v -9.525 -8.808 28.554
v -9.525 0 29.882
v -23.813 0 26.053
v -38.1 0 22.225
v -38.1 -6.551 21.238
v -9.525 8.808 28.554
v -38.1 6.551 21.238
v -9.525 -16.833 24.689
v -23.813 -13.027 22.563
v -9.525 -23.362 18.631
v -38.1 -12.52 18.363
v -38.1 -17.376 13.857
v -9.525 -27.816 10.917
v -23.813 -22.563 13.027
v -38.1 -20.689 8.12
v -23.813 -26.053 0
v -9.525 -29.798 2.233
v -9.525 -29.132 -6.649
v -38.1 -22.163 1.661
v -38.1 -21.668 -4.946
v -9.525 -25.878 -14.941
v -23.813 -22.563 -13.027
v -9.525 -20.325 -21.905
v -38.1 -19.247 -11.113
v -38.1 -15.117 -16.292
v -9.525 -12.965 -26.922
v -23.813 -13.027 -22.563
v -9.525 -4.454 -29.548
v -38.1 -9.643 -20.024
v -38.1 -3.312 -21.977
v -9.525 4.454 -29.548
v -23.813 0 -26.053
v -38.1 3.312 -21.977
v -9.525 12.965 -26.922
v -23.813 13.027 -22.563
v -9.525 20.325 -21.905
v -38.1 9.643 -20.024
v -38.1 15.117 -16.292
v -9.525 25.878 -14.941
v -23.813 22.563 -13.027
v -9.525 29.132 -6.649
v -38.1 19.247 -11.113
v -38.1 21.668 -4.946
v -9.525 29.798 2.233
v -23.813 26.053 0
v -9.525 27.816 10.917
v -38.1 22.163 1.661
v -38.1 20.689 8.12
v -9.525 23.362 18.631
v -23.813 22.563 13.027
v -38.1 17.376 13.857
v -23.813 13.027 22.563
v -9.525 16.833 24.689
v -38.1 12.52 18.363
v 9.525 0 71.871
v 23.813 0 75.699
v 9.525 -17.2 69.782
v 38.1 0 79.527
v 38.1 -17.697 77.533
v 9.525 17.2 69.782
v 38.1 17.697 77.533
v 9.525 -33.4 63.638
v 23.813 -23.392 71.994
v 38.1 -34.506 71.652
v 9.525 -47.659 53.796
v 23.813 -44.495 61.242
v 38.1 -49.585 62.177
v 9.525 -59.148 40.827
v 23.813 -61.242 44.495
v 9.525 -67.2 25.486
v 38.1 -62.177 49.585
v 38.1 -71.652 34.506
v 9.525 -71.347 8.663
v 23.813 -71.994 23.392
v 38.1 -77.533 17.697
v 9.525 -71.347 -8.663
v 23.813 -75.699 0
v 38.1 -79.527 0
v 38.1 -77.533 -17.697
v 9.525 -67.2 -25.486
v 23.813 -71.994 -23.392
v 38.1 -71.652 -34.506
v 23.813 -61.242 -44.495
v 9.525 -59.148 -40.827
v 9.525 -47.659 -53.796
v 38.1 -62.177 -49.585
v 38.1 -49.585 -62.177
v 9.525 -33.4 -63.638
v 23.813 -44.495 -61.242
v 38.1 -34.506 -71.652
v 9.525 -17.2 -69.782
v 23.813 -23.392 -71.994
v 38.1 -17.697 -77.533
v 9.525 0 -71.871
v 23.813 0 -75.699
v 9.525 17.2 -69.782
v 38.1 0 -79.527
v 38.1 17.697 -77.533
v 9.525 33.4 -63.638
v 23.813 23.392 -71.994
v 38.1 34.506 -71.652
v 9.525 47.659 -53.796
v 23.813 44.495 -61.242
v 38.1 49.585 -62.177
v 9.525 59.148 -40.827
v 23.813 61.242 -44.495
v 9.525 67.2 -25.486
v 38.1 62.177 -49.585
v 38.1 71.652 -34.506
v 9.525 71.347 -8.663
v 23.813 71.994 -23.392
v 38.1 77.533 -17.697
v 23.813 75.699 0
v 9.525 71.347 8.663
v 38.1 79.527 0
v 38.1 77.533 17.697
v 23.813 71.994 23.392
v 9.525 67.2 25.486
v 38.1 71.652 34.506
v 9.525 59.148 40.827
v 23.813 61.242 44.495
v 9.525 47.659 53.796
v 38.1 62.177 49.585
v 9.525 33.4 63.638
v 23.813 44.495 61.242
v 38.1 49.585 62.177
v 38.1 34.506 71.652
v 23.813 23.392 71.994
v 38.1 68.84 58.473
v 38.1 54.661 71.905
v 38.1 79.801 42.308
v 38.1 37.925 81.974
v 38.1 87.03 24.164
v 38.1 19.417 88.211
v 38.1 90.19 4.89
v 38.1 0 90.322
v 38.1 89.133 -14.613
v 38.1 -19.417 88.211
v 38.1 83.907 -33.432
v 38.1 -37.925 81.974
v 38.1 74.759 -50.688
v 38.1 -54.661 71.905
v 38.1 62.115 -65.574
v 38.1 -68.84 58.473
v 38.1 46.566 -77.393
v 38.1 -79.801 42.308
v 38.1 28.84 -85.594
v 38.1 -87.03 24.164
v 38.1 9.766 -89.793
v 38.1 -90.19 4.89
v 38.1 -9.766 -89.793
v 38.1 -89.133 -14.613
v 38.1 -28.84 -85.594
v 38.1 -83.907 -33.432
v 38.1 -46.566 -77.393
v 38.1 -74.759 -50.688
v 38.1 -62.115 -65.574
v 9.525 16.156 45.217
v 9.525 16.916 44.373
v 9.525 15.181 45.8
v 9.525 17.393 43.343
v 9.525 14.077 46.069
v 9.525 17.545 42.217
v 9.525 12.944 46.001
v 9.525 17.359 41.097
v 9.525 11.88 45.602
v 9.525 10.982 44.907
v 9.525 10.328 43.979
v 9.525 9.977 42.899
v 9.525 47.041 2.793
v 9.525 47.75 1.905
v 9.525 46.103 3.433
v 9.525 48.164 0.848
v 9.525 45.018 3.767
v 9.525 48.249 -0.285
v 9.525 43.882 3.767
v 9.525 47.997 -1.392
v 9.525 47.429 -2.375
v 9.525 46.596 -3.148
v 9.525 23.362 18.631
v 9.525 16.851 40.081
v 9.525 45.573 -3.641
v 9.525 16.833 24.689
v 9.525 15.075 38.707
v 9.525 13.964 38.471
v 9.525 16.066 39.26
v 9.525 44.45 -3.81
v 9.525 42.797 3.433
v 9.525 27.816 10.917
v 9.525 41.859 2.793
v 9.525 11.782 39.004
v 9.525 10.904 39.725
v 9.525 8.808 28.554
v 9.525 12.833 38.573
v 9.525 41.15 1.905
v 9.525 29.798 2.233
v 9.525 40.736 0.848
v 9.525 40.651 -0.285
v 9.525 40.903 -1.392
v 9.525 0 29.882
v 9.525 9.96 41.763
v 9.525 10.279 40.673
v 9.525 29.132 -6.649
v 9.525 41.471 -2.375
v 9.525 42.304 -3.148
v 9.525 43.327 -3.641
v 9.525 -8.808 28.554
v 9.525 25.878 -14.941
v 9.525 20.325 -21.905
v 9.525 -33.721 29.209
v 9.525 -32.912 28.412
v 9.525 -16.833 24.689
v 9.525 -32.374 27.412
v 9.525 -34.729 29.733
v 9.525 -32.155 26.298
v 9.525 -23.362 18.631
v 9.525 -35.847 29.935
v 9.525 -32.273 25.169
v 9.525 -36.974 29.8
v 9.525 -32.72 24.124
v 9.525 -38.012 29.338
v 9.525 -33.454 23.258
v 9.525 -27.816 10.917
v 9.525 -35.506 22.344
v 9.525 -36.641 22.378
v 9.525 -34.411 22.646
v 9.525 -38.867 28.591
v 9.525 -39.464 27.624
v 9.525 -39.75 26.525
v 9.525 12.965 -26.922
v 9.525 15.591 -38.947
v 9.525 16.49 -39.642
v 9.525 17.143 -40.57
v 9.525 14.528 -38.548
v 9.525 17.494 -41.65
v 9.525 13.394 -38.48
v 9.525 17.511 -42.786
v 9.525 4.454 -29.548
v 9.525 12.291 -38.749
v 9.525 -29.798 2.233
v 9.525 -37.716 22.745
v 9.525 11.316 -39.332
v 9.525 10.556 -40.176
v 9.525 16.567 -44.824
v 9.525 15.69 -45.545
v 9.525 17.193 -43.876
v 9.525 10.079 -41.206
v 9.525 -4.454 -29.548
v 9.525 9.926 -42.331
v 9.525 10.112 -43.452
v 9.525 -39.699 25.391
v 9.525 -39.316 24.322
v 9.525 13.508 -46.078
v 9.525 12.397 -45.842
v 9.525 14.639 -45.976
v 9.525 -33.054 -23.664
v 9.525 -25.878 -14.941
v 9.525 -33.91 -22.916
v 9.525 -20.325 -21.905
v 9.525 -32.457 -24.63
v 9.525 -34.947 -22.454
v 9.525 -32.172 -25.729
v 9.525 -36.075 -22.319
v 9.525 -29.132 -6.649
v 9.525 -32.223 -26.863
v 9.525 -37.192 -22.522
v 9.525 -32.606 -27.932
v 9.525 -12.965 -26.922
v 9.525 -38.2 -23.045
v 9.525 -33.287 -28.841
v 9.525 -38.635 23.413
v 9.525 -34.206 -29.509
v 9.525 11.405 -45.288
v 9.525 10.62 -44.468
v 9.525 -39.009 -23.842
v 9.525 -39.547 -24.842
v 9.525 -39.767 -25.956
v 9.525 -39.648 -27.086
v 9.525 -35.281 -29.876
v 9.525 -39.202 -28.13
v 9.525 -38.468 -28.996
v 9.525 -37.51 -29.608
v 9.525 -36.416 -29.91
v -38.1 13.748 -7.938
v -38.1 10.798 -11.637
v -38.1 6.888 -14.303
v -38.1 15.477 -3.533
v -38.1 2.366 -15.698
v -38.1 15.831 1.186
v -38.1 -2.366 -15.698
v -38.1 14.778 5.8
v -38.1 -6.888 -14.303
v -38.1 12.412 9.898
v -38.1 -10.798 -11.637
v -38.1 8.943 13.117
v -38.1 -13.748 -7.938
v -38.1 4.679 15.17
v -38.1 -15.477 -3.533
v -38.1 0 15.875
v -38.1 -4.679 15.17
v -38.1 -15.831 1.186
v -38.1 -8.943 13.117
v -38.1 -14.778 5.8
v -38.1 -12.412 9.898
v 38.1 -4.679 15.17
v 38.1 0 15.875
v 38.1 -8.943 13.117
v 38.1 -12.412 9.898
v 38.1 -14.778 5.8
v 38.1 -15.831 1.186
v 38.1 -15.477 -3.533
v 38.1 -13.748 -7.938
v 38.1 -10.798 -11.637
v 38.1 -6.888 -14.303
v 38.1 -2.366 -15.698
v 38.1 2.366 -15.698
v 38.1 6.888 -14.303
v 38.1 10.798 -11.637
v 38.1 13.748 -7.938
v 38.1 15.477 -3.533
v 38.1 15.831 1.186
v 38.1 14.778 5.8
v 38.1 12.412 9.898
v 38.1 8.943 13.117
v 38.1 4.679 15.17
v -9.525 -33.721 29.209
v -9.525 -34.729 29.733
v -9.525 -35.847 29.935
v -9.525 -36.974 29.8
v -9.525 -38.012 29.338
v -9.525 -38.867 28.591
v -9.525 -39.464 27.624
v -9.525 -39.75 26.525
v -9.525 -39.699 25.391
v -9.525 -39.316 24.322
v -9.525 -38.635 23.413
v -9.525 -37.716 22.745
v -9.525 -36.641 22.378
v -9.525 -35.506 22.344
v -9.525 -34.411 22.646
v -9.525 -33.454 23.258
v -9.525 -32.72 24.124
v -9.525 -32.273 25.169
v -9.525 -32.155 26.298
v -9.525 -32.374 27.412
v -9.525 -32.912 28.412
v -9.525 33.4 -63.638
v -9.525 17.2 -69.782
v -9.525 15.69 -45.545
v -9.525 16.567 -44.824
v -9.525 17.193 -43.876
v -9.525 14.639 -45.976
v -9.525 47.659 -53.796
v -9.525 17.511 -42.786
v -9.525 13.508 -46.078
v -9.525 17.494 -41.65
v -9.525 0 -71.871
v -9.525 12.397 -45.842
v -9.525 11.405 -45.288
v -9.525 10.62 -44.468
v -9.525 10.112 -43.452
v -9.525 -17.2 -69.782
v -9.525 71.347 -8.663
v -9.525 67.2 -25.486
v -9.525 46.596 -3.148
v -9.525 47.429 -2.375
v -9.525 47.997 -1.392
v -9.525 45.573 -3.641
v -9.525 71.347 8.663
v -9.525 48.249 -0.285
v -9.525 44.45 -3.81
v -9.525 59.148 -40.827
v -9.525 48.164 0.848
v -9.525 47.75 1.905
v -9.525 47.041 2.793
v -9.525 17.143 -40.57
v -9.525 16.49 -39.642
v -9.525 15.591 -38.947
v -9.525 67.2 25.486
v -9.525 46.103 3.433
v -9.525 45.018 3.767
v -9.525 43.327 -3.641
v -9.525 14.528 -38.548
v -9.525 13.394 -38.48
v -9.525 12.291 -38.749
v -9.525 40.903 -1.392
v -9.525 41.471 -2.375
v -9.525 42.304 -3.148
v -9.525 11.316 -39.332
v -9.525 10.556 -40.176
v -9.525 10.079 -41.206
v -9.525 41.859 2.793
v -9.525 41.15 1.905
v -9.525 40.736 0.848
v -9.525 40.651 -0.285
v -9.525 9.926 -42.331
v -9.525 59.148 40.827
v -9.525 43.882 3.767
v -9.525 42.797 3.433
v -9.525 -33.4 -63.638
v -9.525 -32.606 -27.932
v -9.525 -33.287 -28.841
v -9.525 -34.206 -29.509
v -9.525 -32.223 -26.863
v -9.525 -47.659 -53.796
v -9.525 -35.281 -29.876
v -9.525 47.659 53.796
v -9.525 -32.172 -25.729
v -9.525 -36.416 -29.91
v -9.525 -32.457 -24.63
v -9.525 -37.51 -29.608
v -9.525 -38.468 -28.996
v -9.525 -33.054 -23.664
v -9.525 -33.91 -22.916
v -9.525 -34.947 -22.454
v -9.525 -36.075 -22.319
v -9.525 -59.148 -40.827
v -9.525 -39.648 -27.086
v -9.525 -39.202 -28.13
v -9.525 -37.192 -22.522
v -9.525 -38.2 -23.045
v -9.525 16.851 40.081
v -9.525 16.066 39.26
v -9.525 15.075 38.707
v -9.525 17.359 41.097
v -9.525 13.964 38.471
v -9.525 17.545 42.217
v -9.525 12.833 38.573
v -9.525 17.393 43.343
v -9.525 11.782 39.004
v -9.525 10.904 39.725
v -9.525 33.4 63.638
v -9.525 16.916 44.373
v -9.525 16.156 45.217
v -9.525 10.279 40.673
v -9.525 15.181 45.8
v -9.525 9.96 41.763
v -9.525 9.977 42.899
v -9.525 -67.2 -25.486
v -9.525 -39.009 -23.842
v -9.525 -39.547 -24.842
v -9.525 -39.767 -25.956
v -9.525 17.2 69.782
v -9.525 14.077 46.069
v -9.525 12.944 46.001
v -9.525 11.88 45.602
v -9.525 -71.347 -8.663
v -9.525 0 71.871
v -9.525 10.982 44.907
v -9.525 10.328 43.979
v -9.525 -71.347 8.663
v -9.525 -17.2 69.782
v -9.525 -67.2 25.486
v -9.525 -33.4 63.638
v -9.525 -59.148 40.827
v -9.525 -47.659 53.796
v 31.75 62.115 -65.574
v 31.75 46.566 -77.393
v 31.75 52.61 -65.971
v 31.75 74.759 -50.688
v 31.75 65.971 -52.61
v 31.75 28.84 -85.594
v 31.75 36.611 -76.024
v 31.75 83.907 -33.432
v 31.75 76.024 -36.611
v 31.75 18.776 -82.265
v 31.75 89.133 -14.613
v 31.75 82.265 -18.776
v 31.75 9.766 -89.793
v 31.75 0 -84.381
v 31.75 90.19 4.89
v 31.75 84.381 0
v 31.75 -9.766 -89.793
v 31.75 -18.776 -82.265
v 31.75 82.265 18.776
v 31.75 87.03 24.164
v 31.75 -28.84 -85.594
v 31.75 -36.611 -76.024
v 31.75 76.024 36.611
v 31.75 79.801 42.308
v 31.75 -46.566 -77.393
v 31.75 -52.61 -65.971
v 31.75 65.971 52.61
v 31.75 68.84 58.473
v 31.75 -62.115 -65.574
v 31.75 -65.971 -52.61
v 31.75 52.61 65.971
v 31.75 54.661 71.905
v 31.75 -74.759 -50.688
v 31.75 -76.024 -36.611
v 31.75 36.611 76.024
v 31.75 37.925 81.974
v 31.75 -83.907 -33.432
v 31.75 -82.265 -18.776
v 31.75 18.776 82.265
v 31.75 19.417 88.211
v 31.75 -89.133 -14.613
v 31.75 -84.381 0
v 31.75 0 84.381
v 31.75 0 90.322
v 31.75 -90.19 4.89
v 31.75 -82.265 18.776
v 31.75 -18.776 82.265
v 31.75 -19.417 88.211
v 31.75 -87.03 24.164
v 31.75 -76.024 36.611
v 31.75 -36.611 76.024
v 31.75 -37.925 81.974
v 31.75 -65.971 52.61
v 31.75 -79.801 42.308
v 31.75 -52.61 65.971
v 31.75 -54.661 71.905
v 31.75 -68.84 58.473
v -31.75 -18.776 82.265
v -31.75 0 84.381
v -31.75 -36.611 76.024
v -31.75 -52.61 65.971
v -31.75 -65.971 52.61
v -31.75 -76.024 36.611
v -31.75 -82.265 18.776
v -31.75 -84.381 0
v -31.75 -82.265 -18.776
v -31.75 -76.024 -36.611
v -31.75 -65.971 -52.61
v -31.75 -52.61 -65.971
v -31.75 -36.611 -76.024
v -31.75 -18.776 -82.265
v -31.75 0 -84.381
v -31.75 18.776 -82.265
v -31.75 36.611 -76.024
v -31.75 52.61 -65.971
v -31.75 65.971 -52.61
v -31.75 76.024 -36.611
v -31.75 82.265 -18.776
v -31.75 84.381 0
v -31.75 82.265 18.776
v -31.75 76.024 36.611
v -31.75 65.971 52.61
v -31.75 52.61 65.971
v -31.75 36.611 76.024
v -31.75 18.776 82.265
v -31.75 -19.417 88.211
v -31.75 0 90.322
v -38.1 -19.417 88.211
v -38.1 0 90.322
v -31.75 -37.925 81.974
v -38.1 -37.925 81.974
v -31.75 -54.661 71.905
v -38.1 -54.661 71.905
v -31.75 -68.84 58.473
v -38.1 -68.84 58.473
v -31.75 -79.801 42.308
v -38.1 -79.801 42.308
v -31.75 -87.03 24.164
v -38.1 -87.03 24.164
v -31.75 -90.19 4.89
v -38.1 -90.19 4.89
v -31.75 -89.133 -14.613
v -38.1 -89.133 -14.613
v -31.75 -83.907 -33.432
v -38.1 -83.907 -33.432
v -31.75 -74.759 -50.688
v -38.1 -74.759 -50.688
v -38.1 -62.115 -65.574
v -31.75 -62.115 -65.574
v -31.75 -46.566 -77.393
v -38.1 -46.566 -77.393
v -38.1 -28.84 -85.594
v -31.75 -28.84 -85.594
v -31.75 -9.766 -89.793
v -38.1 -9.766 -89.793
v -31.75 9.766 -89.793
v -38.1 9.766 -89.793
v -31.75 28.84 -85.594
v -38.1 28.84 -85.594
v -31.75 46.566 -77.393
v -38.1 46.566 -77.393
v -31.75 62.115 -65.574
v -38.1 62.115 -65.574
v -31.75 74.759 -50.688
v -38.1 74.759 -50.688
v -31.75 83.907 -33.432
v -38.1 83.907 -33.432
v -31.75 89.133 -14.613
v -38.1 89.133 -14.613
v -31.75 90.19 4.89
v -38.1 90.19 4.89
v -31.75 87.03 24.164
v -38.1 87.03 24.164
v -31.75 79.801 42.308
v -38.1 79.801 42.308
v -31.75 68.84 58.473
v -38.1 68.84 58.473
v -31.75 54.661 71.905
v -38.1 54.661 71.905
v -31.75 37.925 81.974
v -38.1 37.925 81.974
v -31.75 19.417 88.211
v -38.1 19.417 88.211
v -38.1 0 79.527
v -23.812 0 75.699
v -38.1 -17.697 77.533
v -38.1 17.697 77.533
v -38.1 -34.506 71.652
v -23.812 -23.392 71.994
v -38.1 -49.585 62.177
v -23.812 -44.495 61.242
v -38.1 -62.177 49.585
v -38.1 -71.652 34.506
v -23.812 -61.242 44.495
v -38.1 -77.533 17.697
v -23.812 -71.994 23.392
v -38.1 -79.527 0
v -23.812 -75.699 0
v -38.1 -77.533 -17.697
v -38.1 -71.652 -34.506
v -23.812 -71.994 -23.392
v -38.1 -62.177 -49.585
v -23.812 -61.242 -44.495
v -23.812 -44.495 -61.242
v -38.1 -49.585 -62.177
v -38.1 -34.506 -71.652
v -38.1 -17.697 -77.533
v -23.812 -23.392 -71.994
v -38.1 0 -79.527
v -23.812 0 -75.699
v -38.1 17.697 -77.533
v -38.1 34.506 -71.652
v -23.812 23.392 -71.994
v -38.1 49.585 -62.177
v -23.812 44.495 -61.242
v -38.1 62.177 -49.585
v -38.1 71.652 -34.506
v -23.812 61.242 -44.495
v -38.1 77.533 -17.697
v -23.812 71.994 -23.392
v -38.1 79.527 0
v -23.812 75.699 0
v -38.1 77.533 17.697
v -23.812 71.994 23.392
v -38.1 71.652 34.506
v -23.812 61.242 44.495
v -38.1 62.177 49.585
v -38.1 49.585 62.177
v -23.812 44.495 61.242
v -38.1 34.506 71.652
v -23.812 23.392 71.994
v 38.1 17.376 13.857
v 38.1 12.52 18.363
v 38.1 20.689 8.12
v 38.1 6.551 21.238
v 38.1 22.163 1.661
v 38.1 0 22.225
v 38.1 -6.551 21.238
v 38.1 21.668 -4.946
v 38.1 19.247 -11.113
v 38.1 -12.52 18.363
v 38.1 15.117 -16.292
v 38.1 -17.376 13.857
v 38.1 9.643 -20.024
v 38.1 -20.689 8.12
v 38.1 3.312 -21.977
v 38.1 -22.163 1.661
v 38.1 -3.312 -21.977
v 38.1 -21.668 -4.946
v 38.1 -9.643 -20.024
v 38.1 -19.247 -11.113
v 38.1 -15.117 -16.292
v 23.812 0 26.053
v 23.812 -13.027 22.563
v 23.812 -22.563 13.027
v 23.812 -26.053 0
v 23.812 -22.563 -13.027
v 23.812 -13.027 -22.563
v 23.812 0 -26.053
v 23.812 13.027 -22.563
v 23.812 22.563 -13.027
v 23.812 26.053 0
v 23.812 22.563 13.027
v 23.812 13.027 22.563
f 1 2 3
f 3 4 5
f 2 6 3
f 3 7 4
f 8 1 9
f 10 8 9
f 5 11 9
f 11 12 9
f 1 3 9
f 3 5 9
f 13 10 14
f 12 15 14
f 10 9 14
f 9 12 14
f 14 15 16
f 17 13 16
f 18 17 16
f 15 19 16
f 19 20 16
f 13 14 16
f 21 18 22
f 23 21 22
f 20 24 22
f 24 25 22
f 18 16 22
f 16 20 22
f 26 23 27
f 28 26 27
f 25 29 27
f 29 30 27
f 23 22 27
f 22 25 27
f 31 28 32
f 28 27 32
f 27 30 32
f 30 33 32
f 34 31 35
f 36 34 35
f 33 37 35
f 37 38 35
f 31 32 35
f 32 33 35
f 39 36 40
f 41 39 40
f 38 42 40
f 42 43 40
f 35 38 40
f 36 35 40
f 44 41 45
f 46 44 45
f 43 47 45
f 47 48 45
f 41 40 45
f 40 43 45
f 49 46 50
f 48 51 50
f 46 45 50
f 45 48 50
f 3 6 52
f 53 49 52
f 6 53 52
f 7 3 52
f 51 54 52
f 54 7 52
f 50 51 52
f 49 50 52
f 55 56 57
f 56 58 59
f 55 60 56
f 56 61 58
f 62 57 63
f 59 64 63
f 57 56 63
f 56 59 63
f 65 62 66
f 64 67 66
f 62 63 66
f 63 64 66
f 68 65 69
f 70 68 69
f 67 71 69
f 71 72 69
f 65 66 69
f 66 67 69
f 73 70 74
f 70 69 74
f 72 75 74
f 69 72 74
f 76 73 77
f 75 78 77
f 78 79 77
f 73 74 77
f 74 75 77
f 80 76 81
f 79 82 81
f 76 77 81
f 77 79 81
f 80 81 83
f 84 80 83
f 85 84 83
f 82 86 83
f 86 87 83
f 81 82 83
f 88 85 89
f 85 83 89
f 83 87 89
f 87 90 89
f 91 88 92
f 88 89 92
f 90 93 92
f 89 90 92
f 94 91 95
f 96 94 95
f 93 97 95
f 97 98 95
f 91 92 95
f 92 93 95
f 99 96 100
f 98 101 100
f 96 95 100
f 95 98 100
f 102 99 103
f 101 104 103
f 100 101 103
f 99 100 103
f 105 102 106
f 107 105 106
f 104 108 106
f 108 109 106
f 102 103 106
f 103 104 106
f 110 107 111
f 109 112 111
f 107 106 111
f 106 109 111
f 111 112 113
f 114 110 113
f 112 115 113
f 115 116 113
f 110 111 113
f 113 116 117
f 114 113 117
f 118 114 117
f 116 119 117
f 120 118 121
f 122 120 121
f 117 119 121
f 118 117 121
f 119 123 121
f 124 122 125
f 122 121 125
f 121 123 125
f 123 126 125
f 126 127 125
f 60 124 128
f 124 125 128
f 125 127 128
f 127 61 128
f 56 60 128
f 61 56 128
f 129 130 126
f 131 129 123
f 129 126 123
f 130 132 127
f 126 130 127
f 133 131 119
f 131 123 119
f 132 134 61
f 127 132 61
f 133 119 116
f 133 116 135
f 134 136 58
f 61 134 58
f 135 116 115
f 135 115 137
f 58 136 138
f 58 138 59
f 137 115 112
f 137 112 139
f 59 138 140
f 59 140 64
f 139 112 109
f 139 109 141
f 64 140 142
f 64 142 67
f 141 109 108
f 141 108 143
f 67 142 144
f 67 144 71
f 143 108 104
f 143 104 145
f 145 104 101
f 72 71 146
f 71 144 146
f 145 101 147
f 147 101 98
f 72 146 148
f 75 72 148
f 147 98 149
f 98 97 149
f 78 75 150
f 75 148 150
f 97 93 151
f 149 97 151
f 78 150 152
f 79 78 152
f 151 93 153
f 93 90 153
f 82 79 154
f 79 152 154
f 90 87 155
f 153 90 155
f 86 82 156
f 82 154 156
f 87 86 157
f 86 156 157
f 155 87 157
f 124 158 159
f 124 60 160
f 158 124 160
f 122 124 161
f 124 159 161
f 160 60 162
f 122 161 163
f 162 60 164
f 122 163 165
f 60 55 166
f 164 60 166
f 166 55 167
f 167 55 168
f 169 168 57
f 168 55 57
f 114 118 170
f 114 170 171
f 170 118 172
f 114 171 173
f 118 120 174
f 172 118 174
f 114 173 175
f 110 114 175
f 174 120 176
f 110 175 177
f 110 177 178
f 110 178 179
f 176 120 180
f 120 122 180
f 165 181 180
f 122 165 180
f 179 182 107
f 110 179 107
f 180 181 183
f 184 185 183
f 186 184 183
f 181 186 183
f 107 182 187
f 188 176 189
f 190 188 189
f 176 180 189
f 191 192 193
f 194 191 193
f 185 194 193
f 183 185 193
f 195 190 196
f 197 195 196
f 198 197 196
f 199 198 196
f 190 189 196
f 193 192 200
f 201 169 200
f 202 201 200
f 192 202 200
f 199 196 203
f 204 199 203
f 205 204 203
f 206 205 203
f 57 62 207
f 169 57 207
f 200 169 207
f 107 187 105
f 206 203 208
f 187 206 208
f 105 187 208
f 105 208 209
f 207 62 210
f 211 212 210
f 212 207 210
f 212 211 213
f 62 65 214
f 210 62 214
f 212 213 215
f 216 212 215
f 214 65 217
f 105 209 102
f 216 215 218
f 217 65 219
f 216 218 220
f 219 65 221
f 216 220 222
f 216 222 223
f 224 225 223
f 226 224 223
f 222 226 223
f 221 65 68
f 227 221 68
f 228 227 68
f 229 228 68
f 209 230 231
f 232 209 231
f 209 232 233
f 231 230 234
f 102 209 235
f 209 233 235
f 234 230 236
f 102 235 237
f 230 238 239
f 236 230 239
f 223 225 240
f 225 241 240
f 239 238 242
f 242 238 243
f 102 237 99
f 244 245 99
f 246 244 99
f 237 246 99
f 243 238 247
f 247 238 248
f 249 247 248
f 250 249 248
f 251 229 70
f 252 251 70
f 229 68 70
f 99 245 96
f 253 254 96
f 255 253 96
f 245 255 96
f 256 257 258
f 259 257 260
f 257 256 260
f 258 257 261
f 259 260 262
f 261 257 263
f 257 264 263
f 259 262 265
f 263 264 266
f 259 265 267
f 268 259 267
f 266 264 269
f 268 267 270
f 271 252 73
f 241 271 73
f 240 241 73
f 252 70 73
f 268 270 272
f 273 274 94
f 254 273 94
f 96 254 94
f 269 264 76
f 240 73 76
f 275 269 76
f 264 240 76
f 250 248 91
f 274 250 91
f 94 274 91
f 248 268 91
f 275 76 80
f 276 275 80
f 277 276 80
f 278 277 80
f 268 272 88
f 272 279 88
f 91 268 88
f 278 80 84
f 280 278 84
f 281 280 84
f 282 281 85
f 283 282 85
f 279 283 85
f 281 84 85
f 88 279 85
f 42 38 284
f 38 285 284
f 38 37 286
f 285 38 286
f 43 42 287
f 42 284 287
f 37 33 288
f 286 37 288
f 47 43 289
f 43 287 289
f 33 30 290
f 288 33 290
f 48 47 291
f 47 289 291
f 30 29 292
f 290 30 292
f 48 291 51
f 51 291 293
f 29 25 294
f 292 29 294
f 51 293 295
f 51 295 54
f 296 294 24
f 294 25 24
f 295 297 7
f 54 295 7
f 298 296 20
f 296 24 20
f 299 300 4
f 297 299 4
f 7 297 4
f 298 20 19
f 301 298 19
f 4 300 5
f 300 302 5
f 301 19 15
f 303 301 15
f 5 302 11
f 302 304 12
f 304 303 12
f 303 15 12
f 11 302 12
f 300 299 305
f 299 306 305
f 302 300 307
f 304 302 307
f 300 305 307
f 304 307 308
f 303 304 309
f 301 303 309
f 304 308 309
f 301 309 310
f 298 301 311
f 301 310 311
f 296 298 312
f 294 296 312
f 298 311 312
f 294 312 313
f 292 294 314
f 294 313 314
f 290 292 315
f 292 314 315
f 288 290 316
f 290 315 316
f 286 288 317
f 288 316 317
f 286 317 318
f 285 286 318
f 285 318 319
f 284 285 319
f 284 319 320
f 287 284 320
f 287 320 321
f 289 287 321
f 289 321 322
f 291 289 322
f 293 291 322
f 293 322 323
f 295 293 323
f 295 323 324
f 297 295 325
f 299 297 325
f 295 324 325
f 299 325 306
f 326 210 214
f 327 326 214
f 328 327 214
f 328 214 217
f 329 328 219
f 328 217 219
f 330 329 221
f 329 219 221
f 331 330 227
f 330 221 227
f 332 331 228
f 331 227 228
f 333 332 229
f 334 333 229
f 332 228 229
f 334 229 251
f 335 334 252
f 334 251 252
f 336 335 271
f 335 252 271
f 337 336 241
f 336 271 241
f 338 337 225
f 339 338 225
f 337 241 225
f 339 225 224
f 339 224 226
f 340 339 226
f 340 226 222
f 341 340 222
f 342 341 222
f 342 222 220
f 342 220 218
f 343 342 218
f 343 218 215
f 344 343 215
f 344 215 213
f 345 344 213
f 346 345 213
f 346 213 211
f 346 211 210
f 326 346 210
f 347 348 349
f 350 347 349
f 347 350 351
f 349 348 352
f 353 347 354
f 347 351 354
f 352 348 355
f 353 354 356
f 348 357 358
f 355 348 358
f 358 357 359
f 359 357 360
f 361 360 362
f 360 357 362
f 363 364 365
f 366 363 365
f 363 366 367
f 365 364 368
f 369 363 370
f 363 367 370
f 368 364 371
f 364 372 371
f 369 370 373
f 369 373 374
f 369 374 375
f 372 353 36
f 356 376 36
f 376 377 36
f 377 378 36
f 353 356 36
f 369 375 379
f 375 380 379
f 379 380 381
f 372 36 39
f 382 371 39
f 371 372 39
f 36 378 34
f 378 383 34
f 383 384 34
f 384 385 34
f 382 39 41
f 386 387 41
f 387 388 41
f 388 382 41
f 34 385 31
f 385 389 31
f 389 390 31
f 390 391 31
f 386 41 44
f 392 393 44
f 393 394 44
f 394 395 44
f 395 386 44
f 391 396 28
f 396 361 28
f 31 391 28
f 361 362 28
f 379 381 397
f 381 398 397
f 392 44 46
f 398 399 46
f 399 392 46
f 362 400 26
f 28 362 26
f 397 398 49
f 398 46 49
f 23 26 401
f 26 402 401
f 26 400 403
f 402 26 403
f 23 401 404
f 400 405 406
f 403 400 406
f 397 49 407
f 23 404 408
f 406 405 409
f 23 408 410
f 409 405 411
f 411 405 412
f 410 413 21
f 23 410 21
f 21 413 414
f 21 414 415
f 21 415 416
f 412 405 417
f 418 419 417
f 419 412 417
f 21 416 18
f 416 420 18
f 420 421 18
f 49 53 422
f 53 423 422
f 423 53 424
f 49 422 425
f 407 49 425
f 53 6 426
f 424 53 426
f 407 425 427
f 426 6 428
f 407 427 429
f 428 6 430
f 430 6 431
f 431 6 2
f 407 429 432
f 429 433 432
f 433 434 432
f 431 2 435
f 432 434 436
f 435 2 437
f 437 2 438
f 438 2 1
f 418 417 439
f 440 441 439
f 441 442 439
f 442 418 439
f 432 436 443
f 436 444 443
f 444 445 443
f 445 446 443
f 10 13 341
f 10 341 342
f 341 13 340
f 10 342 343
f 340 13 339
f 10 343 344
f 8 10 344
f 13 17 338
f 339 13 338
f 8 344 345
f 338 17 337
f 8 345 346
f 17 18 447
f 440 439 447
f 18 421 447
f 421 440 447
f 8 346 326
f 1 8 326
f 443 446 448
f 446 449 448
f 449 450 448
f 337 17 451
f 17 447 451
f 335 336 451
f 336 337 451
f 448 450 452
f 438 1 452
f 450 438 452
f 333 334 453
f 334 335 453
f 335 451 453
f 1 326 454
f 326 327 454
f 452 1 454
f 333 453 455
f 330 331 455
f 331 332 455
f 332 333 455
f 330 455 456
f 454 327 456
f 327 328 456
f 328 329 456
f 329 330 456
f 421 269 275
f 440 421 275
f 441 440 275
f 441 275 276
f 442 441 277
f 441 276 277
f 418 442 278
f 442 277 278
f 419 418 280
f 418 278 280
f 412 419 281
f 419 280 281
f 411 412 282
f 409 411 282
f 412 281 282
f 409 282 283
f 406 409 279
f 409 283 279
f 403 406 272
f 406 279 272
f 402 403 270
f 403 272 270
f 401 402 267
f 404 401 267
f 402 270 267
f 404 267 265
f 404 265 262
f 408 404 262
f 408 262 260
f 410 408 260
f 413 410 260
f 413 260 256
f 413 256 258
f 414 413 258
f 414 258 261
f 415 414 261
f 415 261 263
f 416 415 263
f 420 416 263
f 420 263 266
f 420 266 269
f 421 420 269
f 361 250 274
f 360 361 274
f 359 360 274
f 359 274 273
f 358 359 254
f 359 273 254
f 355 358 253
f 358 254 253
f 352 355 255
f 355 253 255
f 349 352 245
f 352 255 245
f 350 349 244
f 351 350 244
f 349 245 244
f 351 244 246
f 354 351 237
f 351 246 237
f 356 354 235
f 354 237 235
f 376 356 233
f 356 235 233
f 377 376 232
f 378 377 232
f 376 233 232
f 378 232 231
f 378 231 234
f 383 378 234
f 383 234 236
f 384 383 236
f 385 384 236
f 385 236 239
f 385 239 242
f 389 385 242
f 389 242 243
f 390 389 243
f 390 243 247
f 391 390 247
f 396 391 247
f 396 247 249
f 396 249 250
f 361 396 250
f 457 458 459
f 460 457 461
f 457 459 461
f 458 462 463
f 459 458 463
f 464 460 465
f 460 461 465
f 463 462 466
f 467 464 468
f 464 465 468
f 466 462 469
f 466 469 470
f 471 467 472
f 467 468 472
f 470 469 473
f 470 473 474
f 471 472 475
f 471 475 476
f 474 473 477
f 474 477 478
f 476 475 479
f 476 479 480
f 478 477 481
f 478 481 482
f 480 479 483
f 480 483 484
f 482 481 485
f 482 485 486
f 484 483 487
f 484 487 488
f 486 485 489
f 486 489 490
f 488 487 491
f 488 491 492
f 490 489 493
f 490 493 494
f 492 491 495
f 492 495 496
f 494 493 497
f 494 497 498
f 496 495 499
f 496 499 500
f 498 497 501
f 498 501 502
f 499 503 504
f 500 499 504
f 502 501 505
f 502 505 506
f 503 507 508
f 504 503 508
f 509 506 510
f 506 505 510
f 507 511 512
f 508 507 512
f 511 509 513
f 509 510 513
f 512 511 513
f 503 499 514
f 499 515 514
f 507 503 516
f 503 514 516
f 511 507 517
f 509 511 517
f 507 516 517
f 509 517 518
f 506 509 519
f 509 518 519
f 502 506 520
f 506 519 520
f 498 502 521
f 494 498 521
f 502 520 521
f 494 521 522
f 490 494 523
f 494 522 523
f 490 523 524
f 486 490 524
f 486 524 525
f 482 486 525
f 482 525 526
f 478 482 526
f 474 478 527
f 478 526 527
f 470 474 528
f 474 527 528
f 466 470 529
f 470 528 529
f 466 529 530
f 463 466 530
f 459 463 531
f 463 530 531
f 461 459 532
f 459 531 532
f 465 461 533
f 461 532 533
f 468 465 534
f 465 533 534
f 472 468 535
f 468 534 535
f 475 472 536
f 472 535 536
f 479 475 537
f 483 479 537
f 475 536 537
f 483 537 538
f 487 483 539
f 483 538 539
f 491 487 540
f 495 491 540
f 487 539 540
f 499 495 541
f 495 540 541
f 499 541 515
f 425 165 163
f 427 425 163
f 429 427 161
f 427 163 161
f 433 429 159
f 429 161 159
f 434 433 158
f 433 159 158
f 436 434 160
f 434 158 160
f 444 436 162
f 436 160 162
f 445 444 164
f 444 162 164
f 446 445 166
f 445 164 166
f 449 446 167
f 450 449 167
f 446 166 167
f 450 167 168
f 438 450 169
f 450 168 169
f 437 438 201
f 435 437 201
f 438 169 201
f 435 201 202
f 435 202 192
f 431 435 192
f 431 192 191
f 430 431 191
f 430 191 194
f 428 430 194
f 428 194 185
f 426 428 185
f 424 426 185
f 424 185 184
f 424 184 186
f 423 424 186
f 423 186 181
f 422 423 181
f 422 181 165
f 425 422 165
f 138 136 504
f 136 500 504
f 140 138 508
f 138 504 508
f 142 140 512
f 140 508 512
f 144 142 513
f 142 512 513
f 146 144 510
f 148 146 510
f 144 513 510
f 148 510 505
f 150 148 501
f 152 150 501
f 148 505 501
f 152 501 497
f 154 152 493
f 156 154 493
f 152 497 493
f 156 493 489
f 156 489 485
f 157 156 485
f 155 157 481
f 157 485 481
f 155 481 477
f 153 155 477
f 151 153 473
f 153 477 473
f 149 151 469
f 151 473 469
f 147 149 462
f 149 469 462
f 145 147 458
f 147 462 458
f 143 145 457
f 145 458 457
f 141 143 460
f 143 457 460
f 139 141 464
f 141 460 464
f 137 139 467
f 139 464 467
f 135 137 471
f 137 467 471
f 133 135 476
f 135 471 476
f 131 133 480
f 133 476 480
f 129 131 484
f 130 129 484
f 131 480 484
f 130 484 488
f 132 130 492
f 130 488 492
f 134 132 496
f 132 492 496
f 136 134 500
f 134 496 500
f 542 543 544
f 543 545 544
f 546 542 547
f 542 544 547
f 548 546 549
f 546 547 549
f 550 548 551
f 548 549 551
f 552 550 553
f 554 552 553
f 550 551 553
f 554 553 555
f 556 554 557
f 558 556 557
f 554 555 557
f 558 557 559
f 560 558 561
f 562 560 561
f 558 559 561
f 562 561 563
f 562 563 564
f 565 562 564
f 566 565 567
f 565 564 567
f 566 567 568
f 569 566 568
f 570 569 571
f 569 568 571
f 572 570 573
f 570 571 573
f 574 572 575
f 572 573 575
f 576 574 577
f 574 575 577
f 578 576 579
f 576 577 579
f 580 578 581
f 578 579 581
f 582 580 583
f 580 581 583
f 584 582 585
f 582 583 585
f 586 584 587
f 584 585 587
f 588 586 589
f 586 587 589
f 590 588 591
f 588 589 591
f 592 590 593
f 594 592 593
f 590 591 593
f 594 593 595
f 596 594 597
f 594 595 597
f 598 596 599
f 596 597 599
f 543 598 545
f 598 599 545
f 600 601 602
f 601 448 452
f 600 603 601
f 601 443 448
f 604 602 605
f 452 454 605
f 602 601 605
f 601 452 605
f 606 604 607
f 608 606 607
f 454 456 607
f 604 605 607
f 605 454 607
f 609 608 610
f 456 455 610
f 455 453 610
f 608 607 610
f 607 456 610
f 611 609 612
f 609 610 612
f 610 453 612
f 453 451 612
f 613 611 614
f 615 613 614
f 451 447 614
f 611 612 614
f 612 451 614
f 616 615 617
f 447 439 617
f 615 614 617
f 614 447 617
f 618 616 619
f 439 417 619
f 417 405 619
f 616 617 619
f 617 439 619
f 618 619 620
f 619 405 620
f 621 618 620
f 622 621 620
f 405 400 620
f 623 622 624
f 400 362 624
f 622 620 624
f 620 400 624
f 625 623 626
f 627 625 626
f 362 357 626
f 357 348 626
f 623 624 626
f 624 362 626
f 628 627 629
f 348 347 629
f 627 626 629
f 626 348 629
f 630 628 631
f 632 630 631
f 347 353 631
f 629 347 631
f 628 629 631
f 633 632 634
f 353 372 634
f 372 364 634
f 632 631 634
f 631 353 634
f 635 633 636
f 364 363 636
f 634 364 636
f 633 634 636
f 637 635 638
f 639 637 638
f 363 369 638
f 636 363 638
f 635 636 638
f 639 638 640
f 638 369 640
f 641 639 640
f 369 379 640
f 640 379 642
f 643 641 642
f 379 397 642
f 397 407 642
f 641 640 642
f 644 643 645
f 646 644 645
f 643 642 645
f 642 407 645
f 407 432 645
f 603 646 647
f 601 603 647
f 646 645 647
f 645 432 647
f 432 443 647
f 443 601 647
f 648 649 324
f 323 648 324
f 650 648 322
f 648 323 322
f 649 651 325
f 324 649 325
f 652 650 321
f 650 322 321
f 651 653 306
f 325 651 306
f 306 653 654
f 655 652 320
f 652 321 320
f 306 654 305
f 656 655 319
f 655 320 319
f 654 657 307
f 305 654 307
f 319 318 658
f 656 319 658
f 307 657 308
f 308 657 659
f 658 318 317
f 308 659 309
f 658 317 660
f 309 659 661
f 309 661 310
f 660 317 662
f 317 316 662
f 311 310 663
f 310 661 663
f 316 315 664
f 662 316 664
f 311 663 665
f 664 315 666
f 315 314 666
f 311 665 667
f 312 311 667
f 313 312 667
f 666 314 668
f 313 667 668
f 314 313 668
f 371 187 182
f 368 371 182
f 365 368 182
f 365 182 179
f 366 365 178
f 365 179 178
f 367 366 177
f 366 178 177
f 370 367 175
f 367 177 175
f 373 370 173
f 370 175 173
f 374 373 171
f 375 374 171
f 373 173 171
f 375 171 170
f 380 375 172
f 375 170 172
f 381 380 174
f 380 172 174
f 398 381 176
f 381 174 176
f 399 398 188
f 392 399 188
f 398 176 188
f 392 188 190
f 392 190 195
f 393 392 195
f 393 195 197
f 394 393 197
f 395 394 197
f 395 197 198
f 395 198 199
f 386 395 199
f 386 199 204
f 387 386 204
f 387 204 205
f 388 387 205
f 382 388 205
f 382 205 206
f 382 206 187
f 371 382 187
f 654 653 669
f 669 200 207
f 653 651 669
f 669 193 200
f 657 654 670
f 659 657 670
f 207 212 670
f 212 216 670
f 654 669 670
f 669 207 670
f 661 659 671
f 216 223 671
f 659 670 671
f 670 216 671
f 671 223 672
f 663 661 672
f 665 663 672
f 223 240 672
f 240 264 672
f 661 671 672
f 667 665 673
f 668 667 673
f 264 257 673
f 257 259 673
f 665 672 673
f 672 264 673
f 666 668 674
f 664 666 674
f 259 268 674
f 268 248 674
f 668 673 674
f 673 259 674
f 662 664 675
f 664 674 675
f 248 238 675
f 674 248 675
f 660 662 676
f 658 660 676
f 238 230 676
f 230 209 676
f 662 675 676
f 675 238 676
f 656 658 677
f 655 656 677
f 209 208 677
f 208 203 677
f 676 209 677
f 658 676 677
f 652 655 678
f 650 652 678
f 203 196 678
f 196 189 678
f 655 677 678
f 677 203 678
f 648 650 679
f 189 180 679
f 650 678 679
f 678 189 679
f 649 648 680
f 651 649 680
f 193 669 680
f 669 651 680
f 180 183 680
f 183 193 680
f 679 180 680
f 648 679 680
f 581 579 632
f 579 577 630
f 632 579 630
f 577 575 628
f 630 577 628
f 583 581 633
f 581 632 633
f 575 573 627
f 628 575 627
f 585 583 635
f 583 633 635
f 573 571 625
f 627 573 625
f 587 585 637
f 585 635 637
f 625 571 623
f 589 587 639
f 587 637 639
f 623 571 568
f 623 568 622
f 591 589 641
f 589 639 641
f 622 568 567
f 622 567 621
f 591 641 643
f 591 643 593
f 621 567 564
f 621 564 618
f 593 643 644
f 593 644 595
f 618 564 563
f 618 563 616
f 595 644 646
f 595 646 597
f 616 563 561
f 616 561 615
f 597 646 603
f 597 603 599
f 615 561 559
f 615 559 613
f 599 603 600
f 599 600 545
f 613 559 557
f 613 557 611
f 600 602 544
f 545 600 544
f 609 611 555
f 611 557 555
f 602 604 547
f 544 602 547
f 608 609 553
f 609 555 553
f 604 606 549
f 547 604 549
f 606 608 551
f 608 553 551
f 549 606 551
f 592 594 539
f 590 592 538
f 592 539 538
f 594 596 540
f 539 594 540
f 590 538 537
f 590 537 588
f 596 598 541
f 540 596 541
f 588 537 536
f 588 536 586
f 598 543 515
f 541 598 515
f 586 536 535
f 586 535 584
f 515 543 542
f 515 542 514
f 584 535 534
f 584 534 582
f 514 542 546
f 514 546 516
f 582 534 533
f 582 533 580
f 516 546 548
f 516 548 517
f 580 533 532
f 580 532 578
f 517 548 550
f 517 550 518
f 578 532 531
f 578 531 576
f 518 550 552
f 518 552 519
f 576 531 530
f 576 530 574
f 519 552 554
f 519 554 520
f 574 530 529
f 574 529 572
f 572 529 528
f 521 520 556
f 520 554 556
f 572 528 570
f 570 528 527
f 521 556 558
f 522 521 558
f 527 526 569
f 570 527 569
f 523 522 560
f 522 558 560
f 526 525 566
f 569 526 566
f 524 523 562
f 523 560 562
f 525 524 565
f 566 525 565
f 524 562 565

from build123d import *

# Parameters (mm, degrees)
SKETCH2_R          = 3.81
CUT_EXTRUDE1_DEPTH = 137.324658476
CIRPATTERN1_COUNT  = 5


with BuildPart() as part:
    # Sketch1 → Revolve2 (revolve)
    with BuildSketch(Plane.XY, mode=Mode.PRIVATE) as revolve2_sk:
        Polygon((38.1, 90.3224), (31.75, 90.3224), (31.75, 84.380681481), (-31.75, 84.380681481), (-31.75, 90.3224), (-38.1, 90.3224), (-38.1, 79.5274), (-9.525, 71.870751826), (-9.525, 29.881648174), (-38.1, 22.225), (-38.1, 15.875), (38.1, 15.875), (38.1, 22.225), (9.525, 29.881648174), (9.525, 71.870751826), (38.1, 79.5274), align=None)
    revolve(revolve2_sk.sketch.rotate(Axis((-1499.65664488, 0, 0), (1, 0, 0)), 90), axis=Axis((-1499.65664488, 0, 0), (1, 0, 0)))

    # Sketch2 → Cut-Extrude1 (cut, through all)
    with BuildSketch(Plane(origin=(9.525, 0, 0), x_dir=(0, 0, -1), z_dir=(1, 0, 0))):
        with Locations((0, 44.45)):
            Circle(SKETCH2_R)
    cut_extrude1 = extrude(amount=-CUT_EXTRUDE1_DEPTH, mode=Mode.SUBTRACT)

    # CirPattern1: Cut-Extrude1 ×5 about axis
    cirpattern1_axis = Axis((0, 0, 0), (1, 0, 0))
    for i in range(1, CIRPATTERN1_COUNT):
        add(cut_extrude1.rotate(cirpattern1_axis, i * 360 / CIRPATTERN1_COUNT), mode=Mode.SUBTRACT)


solid = part.part
